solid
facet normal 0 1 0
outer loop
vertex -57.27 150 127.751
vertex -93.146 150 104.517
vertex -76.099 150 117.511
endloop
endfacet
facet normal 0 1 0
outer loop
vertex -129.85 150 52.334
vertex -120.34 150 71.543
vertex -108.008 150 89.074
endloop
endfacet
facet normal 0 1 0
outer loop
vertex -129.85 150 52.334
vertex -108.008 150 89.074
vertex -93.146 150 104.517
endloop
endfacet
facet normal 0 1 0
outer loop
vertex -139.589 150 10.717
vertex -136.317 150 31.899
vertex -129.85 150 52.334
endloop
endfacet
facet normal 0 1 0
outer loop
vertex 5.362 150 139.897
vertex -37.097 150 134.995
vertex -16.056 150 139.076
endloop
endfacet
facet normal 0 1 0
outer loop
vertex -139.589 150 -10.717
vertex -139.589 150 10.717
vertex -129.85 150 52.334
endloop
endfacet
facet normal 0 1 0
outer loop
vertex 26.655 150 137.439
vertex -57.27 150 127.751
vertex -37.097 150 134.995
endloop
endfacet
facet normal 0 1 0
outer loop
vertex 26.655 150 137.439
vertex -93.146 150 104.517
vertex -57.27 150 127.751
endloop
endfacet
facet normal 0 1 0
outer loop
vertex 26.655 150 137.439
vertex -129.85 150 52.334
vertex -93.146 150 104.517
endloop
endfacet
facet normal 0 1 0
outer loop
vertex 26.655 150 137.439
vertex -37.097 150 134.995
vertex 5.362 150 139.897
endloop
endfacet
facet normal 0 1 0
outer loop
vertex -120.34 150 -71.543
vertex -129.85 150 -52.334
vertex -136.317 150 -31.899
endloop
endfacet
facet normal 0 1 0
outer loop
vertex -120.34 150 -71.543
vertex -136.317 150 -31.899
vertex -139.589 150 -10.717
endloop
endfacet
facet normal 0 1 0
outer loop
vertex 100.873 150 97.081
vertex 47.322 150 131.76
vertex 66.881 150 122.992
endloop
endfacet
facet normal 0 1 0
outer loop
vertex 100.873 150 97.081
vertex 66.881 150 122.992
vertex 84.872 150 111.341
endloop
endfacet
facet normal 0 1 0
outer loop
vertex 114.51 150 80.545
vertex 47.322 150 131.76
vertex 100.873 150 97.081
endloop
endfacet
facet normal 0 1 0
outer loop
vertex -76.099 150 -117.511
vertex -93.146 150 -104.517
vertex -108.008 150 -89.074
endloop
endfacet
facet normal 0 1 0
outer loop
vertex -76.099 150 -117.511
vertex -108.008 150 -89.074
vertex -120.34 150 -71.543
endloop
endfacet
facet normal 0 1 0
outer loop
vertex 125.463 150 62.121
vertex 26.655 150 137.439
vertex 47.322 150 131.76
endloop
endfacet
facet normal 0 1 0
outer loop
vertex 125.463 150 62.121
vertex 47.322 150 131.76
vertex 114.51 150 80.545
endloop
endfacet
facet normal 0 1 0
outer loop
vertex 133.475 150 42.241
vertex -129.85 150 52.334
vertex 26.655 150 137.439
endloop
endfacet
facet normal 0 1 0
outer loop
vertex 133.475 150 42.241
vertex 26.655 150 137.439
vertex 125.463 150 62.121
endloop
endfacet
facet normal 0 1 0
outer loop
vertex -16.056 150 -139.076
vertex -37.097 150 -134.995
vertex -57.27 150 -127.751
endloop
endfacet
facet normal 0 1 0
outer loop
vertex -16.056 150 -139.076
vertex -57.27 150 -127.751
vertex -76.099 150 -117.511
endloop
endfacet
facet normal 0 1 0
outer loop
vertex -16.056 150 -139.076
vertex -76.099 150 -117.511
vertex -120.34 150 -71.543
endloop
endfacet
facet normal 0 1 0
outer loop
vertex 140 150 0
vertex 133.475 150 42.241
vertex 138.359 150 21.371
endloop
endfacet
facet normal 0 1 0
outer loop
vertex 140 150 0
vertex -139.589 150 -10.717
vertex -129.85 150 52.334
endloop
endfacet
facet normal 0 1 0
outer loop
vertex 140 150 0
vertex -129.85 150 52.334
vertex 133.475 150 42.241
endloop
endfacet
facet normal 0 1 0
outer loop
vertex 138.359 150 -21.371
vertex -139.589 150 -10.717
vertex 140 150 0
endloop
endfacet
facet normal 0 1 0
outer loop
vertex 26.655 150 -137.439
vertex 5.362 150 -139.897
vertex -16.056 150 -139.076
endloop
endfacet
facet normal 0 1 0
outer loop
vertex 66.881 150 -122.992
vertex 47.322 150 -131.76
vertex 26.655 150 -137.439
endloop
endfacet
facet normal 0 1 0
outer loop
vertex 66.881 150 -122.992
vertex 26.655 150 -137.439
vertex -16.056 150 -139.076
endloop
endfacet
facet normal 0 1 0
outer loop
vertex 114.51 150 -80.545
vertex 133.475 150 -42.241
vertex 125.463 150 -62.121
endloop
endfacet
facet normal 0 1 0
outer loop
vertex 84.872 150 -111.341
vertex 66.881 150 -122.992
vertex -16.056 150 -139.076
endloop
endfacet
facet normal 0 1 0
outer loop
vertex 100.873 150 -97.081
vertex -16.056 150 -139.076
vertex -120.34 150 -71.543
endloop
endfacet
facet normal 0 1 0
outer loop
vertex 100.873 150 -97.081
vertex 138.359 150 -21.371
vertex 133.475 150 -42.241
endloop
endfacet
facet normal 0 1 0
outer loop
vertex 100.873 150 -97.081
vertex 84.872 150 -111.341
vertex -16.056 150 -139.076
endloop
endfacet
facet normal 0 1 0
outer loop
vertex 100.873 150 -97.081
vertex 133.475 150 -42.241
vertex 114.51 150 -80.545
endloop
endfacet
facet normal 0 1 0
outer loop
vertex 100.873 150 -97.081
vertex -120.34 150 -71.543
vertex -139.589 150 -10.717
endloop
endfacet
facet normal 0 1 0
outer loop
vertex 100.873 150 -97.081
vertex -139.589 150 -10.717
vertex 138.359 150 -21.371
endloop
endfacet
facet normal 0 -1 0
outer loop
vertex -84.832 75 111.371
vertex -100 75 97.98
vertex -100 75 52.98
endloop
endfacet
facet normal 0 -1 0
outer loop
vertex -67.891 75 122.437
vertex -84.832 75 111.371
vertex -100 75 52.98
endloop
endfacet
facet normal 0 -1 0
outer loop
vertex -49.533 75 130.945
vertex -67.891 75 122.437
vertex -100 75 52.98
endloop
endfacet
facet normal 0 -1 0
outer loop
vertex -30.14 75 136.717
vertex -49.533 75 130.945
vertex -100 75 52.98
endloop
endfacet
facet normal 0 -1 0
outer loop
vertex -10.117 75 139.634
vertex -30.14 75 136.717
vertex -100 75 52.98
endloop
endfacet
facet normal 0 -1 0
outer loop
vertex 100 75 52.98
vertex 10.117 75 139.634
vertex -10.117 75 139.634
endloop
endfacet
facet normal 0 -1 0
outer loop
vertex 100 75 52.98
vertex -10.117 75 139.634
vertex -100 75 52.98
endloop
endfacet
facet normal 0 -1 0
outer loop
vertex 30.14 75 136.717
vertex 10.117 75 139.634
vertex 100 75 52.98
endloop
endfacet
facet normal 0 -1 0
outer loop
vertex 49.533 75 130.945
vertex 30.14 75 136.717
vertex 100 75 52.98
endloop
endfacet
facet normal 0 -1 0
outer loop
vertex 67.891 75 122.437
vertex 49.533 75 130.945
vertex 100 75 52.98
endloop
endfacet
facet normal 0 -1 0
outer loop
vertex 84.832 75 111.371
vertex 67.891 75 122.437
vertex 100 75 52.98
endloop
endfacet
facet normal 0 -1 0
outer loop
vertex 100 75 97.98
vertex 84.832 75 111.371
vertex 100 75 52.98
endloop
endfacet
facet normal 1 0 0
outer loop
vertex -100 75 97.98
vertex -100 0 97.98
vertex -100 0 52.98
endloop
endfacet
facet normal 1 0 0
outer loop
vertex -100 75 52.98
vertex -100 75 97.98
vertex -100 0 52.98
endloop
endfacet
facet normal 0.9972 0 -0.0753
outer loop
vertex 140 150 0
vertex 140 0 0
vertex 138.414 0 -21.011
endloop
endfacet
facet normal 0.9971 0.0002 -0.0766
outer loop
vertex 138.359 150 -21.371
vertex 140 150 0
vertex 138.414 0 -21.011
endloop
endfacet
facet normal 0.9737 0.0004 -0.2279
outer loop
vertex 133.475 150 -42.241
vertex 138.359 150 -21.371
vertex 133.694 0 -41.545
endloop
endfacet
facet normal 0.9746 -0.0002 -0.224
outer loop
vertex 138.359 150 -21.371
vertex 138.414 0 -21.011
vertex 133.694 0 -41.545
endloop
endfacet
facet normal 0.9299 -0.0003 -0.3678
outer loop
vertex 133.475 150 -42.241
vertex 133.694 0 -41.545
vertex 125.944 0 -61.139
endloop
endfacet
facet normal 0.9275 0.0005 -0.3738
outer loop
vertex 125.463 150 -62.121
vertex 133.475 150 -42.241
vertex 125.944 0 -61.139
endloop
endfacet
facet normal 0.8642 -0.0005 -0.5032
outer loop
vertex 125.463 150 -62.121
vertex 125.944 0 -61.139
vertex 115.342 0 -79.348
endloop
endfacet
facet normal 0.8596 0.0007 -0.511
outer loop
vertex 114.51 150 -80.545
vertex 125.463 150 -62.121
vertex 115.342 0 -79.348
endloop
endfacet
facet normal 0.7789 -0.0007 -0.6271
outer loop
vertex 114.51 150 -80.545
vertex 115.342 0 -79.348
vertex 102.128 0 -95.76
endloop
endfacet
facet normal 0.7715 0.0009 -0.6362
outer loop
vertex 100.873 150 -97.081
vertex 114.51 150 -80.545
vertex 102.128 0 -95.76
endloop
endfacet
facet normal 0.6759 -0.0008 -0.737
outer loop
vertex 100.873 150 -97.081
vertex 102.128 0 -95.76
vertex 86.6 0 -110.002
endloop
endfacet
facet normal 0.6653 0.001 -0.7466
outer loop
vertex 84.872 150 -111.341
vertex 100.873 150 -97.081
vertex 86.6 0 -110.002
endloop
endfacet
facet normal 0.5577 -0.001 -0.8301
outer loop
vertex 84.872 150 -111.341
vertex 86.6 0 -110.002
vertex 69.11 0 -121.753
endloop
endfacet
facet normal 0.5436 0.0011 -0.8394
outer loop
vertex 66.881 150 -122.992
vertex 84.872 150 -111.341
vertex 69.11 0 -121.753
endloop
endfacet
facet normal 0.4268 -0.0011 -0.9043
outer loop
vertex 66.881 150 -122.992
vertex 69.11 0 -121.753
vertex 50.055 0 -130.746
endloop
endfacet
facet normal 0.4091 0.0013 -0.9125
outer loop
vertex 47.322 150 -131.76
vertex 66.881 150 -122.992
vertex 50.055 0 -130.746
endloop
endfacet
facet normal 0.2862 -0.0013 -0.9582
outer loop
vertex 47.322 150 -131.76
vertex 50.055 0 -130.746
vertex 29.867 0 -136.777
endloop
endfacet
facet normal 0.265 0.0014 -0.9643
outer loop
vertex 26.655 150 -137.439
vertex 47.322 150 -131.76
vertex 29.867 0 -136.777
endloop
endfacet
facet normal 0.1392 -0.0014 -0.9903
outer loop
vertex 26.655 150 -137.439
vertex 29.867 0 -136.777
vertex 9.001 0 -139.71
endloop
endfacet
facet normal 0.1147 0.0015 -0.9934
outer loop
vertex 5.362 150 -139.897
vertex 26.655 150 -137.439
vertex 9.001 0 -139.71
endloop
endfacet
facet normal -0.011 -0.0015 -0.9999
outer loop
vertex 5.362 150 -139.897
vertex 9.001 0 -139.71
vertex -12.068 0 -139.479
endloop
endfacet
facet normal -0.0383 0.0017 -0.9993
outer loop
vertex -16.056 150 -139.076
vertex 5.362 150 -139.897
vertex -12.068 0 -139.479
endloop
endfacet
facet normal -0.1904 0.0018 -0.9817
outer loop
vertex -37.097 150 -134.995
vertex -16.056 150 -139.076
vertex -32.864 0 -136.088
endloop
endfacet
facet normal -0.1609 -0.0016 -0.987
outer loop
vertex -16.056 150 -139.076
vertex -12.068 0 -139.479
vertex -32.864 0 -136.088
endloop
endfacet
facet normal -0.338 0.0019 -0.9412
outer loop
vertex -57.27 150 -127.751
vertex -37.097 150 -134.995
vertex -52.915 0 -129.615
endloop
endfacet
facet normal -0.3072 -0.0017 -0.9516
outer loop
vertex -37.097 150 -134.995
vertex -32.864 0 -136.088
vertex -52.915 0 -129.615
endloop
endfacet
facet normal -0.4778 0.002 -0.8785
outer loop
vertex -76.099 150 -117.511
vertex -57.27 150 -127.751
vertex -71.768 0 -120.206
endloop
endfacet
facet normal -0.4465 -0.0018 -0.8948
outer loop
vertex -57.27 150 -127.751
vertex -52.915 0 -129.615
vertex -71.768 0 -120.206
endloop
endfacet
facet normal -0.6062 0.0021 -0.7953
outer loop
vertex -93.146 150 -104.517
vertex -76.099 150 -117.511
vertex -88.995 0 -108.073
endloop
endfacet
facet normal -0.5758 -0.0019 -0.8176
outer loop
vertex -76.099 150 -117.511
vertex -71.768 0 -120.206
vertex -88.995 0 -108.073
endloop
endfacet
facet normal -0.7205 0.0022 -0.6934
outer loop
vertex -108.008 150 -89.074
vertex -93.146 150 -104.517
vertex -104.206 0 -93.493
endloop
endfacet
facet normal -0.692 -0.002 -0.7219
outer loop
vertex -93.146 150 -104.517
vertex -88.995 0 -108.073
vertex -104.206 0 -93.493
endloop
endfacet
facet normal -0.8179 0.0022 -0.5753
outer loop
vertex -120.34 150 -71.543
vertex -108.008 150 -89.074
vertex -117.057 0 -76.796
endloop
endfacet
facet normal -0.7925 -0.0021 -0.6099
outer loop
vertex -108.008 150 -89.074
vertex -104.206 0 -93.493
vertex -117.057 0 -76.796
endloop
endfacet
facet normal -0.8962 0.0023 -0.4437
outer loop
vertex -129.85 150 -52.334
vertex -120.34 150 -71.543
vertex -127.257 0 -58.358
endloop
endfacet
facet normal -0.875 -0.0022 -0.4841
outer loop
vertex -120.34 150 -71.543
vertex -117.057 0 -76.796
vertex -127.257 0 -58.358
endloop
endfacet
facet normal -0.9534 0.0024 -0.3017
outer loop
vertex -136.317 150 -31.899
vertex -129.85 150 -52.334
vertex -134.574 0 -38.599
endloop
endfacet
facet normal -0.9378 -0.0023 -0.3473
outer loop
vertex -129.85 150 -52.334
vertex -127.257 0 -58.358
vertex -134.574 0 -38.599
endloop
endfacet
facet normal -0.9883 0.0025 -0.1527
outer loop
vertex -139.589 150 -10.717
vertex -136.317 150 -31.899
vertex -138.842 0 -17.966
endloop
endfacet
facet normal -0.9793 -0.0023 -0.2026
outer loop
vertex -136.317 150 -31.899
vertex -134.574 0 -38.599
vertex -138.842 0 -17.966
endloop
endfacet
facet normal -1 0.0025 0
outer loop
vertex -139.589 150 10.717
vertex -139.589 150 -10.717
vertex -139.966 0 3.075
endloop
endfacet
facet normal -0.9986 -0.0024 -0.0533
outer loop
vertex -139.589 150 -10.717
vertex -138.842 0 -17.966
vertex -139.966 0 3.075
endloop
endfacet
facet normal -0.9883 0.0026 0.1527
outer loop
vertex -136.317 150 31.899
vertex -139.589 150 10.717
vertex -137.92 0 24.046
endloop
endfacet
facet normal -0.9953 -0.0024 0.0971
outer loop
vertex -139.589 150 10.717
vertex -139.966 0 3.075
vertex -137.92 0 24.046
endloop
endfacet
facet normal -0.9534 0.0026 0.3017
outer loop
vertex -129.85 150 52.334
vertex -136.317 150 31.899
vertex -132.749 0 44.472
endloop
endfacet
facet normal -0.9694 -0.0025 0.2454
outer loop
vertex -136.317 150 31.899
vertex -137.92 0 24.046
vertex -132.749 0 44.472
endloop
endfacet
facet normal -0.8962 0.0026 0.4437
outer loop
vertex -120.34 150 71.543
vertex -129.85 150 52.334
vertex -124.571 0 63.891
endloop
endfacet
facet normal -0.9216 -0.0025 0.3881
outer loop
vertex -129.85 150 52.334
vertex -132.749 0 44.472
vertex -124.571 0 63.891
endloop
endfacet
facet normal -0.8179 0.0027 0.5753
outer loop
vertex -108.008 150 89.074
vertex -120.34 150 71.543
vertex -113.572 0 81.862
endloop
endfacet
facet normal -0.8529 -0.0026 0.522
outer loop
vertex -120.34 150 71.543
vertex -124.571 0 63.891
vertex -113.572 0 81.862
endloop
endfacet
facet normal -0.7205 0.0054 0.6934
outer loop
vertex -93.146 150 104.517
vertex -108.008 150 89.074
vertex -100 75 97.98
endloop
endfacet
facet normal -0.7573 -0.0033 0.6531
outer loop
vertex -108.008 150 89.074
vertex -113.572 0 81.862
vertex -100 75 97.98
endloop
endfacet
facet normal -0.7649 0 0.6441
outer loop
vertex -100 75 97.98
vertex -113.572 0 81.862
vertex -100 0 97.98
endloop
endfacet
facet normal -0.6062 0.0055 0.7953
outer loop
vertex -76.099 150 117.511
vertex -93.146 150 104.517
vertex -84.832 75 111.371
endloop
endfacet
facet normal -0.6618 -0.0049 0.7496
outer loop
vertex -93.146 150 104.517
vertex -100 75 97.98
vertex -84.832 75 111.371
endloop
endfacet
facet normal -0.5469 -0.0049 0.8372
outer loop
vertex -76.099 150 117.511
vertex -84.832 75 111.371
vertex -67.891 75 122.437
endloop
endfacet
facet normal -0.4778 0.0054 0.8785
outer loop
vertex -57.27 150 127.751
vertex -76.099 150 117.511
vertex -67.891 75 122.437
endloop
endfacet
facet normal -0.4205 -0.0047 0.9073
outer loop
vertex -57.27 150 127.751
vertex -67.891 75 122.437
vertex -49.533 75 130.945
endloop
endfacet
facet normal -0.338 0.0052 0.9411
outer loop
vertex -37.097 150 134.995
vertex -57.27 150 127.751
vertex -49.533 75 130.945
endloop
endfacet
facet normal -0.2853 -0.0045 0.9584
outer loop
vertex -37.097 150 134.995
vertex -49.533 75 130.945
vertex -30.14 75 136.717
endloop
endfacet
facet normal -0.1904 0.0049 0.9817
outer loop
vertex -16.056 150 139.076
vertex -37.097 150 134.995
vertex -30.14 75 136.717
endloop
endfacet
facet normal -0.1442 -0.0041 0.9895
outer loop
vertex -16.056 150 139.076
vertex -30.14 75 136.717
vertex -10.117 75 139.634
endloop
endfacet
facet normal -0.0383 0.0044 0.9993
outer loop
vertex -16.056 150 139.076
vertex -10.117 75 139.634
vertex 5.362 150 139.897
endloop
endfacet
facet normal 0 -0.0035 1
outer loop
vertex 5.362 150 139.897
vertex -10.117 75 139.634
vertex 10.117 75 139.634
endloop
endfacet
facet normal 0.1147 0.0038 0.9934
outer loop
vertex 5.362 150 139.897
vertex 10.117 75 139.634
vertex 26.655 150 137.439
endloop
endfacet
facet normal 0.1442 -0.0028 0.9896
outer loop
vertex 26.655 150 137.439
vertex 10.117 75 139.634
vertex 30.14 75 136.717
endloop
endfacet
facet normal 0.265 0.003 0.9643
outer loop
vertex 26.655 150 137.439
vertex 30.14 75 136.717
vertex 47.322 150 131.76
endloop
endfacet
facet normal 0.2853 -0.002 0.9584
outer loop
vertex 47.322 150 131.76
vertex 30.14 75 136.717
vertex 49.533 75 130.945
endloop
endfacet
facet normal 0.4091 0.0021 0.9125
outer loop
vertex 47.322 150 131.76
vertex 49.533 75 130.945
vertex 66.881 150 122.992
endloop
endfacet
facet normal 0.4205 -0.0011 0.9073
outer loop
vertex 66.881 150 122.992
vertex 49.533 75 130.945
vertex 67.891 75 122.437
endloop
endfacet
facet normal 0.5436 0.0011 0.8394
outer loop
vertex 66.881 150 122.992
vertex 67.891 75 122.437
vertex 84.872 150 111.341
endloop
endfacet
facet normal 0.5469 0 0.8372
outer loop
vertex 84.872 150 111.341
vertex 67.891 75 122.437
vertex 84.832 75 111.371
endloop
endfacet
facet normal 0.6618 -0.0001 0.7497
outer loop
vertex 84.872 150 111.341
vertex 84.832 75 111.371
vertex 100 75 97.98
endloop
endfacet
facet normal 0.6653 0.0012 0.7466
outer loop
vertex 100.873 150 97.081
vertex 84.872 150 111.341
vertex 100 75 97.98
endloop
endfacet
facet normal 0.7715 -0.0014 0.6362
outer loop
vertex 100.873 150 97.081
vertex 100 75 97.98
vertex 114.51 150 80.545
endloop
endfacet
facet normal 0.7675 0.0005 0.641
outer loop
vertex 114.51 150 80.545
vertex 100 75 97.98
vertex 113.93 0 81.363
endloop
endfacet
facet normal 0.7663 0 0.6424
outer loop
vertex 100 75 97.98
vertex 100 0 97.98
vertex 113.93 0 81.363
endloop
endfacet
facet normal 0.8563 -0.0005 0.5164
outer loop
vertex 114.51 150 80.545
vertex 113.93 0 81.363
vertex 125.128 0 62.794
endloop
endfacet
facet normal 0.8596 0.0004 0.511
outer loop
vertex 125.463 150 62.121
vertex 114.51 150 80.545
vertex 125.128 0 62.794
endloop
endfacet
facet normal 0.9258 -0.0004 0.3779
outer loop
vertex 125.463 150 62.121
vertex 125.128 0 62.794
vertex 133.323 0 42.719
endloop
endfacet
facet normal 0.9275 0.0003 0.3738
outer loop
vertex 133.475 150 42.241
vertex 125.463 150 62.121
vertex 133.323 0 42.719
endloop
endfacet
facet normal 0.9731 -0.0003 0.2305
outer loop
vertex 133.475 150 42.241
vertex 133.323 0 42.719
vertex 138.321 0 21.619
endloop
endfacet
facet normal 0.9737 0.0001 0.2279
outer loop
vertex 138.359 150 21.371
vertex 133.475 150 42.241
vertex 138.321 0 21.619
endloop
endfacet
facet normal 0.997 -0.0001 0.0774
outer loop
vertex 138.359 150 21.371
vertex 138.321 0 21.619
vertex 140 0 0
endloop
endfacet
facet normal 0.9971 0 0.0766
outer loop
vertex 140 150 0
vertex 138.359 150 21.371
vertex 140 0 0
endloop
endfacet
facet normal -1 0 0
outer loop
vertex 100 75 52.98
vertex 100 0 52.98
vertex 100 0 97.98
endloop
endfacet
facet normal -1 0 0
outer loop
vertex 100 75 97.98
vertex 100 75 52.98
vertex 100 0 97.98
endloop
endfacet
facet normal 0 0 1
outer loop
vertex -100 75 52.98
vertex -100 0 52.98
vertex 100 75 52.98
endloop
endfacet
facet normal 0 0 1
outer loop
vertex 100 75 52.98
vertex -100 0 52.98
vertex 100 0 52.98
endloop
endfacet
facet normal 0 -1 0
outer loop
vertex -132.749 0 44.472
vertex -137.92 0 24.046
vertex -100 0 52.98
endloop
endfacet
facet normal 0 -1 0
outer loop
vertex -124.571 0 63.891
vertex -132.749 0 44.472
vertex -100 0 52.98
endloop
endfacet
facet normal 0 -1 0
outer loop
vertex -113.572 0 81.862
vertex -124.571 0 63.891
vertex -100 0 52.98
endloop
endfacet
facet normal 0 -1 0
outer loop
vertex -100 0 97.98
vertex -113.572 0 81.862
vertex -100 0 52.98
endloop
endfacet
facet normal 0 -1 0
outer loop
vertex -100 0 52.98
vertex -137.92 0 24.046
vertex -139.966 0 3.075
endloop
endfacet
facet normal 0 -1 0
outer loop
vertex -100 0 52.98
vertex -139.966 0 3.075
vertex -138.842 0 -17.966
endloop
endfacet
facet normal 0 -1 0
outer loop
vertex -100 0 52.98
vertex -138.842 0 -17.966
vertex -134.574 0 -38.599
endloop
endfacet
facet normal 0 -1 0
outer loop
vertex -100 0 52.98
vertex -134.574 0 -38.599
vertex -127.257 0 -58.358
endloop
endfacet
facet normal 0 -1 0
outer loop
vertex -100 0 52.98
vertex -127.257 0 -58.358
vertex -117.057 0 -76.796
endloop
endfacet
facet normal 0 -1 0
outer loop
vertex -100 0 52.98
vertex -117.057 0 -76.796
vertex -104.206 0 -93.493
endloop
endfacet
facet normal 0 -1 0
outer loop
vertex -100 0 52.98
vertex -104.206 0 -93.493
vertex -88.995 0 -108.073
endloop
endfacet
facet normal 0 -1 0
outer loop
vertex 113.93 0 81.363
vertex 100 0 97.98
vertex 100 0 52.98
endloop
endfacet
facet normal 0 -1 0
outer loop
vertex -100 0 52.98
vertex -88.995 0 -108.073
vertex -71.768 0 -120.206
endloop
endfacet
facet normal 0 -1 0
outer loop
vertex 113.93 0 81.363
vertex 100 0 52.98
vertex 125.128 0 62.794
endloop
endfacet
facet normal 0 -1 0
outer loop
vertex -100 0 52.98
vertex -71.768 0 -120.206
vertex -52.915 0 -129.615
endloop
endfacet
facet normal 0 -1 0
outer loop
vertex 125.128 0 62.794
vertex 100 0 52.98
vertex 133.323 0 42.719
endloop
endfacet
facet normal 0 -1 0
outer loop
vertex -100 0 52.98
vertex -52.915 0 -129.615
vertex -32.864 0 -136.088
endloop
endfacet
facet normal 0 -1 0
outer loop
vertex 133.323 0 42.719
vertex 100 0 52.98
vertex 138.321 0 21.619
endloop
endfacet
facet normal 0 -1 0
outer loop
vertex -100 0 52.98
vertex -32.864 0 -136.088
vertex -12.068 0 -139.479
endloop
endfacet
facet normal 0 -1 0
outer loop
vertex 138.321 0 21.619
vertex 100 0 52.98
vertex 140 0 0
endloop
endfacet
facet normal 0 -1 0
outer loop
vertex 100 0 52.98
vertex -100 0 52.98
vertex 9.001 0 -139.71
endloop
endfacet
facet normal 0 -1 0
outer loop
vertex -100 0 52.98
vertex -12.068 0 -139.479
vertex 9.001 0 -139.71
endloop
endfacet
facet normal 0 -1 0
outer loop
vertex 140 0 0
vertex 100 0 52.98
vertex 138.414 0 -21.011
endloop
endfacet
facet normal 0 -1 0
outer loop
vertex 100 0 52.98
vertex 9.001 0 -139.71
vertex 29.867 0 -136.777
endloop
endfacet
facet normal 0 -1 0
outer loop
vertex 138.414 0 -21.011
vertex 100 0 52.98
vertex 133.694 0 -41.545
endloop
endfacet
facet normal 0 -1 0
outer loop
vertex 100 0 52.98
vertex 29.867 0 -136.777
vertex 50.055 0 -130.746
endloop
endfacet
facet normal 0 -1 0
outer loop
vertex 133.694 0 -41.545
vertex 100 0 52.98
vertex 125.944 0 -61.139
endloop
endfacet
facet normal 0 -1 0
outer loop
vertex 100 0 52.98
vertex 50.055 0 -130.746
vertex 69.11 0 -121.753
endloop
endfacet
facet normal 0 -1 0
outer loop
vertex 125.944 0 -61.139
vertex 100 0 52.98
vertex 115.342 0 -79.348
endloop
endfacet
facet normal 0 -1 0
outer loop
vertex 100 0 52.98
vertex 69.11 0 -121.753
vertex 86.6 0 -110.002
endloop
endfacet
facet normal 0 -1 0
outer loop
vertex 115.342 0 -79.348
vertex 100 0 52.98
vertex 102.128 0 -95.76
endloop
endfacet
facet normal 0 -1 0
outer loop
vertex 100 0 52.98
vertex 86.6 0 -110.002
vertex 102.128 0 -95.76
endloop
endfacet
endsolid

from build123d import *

# Parameters (mm, degrees)
SKETCH1_R           = 140
BOSS_EXTRUDE1_DEPTH = 150
CUT_EXTRUDE1_DEPTH  = 75


with BuildPart() as part:
    # Sketch1 → Boss-Extrude1 (new body)
    with BuildSketch(Plane(origin=(0, 0, 0), x_dir=(1, 0, 0), z_dir=(0, 1, 0))):
        Circle(SKETCH1_R)
    extrude(amount=BOSS_EXTRUDE1_DEPTH)

    # Sketch2 → Cut-Extrude1 (cut)
    with BuildSketch(Plane.XZ):
        with BuildLine():
            Line((-100, 97.979589711), (-100, 52.979589711))
            Line((-100, 52.979589711), (100, 52.979589711))
            Line((100, 52.979589711), (100, 97.979589711))
            ThreePointArc((100, 97.979589711), (0, 140), (-100, 97.979589711))
        make_face()
    extrude(amount=-CUT_EXTRUDE1_DEPTH, mode=Mode.SUBTRACT)


solid = part.part
